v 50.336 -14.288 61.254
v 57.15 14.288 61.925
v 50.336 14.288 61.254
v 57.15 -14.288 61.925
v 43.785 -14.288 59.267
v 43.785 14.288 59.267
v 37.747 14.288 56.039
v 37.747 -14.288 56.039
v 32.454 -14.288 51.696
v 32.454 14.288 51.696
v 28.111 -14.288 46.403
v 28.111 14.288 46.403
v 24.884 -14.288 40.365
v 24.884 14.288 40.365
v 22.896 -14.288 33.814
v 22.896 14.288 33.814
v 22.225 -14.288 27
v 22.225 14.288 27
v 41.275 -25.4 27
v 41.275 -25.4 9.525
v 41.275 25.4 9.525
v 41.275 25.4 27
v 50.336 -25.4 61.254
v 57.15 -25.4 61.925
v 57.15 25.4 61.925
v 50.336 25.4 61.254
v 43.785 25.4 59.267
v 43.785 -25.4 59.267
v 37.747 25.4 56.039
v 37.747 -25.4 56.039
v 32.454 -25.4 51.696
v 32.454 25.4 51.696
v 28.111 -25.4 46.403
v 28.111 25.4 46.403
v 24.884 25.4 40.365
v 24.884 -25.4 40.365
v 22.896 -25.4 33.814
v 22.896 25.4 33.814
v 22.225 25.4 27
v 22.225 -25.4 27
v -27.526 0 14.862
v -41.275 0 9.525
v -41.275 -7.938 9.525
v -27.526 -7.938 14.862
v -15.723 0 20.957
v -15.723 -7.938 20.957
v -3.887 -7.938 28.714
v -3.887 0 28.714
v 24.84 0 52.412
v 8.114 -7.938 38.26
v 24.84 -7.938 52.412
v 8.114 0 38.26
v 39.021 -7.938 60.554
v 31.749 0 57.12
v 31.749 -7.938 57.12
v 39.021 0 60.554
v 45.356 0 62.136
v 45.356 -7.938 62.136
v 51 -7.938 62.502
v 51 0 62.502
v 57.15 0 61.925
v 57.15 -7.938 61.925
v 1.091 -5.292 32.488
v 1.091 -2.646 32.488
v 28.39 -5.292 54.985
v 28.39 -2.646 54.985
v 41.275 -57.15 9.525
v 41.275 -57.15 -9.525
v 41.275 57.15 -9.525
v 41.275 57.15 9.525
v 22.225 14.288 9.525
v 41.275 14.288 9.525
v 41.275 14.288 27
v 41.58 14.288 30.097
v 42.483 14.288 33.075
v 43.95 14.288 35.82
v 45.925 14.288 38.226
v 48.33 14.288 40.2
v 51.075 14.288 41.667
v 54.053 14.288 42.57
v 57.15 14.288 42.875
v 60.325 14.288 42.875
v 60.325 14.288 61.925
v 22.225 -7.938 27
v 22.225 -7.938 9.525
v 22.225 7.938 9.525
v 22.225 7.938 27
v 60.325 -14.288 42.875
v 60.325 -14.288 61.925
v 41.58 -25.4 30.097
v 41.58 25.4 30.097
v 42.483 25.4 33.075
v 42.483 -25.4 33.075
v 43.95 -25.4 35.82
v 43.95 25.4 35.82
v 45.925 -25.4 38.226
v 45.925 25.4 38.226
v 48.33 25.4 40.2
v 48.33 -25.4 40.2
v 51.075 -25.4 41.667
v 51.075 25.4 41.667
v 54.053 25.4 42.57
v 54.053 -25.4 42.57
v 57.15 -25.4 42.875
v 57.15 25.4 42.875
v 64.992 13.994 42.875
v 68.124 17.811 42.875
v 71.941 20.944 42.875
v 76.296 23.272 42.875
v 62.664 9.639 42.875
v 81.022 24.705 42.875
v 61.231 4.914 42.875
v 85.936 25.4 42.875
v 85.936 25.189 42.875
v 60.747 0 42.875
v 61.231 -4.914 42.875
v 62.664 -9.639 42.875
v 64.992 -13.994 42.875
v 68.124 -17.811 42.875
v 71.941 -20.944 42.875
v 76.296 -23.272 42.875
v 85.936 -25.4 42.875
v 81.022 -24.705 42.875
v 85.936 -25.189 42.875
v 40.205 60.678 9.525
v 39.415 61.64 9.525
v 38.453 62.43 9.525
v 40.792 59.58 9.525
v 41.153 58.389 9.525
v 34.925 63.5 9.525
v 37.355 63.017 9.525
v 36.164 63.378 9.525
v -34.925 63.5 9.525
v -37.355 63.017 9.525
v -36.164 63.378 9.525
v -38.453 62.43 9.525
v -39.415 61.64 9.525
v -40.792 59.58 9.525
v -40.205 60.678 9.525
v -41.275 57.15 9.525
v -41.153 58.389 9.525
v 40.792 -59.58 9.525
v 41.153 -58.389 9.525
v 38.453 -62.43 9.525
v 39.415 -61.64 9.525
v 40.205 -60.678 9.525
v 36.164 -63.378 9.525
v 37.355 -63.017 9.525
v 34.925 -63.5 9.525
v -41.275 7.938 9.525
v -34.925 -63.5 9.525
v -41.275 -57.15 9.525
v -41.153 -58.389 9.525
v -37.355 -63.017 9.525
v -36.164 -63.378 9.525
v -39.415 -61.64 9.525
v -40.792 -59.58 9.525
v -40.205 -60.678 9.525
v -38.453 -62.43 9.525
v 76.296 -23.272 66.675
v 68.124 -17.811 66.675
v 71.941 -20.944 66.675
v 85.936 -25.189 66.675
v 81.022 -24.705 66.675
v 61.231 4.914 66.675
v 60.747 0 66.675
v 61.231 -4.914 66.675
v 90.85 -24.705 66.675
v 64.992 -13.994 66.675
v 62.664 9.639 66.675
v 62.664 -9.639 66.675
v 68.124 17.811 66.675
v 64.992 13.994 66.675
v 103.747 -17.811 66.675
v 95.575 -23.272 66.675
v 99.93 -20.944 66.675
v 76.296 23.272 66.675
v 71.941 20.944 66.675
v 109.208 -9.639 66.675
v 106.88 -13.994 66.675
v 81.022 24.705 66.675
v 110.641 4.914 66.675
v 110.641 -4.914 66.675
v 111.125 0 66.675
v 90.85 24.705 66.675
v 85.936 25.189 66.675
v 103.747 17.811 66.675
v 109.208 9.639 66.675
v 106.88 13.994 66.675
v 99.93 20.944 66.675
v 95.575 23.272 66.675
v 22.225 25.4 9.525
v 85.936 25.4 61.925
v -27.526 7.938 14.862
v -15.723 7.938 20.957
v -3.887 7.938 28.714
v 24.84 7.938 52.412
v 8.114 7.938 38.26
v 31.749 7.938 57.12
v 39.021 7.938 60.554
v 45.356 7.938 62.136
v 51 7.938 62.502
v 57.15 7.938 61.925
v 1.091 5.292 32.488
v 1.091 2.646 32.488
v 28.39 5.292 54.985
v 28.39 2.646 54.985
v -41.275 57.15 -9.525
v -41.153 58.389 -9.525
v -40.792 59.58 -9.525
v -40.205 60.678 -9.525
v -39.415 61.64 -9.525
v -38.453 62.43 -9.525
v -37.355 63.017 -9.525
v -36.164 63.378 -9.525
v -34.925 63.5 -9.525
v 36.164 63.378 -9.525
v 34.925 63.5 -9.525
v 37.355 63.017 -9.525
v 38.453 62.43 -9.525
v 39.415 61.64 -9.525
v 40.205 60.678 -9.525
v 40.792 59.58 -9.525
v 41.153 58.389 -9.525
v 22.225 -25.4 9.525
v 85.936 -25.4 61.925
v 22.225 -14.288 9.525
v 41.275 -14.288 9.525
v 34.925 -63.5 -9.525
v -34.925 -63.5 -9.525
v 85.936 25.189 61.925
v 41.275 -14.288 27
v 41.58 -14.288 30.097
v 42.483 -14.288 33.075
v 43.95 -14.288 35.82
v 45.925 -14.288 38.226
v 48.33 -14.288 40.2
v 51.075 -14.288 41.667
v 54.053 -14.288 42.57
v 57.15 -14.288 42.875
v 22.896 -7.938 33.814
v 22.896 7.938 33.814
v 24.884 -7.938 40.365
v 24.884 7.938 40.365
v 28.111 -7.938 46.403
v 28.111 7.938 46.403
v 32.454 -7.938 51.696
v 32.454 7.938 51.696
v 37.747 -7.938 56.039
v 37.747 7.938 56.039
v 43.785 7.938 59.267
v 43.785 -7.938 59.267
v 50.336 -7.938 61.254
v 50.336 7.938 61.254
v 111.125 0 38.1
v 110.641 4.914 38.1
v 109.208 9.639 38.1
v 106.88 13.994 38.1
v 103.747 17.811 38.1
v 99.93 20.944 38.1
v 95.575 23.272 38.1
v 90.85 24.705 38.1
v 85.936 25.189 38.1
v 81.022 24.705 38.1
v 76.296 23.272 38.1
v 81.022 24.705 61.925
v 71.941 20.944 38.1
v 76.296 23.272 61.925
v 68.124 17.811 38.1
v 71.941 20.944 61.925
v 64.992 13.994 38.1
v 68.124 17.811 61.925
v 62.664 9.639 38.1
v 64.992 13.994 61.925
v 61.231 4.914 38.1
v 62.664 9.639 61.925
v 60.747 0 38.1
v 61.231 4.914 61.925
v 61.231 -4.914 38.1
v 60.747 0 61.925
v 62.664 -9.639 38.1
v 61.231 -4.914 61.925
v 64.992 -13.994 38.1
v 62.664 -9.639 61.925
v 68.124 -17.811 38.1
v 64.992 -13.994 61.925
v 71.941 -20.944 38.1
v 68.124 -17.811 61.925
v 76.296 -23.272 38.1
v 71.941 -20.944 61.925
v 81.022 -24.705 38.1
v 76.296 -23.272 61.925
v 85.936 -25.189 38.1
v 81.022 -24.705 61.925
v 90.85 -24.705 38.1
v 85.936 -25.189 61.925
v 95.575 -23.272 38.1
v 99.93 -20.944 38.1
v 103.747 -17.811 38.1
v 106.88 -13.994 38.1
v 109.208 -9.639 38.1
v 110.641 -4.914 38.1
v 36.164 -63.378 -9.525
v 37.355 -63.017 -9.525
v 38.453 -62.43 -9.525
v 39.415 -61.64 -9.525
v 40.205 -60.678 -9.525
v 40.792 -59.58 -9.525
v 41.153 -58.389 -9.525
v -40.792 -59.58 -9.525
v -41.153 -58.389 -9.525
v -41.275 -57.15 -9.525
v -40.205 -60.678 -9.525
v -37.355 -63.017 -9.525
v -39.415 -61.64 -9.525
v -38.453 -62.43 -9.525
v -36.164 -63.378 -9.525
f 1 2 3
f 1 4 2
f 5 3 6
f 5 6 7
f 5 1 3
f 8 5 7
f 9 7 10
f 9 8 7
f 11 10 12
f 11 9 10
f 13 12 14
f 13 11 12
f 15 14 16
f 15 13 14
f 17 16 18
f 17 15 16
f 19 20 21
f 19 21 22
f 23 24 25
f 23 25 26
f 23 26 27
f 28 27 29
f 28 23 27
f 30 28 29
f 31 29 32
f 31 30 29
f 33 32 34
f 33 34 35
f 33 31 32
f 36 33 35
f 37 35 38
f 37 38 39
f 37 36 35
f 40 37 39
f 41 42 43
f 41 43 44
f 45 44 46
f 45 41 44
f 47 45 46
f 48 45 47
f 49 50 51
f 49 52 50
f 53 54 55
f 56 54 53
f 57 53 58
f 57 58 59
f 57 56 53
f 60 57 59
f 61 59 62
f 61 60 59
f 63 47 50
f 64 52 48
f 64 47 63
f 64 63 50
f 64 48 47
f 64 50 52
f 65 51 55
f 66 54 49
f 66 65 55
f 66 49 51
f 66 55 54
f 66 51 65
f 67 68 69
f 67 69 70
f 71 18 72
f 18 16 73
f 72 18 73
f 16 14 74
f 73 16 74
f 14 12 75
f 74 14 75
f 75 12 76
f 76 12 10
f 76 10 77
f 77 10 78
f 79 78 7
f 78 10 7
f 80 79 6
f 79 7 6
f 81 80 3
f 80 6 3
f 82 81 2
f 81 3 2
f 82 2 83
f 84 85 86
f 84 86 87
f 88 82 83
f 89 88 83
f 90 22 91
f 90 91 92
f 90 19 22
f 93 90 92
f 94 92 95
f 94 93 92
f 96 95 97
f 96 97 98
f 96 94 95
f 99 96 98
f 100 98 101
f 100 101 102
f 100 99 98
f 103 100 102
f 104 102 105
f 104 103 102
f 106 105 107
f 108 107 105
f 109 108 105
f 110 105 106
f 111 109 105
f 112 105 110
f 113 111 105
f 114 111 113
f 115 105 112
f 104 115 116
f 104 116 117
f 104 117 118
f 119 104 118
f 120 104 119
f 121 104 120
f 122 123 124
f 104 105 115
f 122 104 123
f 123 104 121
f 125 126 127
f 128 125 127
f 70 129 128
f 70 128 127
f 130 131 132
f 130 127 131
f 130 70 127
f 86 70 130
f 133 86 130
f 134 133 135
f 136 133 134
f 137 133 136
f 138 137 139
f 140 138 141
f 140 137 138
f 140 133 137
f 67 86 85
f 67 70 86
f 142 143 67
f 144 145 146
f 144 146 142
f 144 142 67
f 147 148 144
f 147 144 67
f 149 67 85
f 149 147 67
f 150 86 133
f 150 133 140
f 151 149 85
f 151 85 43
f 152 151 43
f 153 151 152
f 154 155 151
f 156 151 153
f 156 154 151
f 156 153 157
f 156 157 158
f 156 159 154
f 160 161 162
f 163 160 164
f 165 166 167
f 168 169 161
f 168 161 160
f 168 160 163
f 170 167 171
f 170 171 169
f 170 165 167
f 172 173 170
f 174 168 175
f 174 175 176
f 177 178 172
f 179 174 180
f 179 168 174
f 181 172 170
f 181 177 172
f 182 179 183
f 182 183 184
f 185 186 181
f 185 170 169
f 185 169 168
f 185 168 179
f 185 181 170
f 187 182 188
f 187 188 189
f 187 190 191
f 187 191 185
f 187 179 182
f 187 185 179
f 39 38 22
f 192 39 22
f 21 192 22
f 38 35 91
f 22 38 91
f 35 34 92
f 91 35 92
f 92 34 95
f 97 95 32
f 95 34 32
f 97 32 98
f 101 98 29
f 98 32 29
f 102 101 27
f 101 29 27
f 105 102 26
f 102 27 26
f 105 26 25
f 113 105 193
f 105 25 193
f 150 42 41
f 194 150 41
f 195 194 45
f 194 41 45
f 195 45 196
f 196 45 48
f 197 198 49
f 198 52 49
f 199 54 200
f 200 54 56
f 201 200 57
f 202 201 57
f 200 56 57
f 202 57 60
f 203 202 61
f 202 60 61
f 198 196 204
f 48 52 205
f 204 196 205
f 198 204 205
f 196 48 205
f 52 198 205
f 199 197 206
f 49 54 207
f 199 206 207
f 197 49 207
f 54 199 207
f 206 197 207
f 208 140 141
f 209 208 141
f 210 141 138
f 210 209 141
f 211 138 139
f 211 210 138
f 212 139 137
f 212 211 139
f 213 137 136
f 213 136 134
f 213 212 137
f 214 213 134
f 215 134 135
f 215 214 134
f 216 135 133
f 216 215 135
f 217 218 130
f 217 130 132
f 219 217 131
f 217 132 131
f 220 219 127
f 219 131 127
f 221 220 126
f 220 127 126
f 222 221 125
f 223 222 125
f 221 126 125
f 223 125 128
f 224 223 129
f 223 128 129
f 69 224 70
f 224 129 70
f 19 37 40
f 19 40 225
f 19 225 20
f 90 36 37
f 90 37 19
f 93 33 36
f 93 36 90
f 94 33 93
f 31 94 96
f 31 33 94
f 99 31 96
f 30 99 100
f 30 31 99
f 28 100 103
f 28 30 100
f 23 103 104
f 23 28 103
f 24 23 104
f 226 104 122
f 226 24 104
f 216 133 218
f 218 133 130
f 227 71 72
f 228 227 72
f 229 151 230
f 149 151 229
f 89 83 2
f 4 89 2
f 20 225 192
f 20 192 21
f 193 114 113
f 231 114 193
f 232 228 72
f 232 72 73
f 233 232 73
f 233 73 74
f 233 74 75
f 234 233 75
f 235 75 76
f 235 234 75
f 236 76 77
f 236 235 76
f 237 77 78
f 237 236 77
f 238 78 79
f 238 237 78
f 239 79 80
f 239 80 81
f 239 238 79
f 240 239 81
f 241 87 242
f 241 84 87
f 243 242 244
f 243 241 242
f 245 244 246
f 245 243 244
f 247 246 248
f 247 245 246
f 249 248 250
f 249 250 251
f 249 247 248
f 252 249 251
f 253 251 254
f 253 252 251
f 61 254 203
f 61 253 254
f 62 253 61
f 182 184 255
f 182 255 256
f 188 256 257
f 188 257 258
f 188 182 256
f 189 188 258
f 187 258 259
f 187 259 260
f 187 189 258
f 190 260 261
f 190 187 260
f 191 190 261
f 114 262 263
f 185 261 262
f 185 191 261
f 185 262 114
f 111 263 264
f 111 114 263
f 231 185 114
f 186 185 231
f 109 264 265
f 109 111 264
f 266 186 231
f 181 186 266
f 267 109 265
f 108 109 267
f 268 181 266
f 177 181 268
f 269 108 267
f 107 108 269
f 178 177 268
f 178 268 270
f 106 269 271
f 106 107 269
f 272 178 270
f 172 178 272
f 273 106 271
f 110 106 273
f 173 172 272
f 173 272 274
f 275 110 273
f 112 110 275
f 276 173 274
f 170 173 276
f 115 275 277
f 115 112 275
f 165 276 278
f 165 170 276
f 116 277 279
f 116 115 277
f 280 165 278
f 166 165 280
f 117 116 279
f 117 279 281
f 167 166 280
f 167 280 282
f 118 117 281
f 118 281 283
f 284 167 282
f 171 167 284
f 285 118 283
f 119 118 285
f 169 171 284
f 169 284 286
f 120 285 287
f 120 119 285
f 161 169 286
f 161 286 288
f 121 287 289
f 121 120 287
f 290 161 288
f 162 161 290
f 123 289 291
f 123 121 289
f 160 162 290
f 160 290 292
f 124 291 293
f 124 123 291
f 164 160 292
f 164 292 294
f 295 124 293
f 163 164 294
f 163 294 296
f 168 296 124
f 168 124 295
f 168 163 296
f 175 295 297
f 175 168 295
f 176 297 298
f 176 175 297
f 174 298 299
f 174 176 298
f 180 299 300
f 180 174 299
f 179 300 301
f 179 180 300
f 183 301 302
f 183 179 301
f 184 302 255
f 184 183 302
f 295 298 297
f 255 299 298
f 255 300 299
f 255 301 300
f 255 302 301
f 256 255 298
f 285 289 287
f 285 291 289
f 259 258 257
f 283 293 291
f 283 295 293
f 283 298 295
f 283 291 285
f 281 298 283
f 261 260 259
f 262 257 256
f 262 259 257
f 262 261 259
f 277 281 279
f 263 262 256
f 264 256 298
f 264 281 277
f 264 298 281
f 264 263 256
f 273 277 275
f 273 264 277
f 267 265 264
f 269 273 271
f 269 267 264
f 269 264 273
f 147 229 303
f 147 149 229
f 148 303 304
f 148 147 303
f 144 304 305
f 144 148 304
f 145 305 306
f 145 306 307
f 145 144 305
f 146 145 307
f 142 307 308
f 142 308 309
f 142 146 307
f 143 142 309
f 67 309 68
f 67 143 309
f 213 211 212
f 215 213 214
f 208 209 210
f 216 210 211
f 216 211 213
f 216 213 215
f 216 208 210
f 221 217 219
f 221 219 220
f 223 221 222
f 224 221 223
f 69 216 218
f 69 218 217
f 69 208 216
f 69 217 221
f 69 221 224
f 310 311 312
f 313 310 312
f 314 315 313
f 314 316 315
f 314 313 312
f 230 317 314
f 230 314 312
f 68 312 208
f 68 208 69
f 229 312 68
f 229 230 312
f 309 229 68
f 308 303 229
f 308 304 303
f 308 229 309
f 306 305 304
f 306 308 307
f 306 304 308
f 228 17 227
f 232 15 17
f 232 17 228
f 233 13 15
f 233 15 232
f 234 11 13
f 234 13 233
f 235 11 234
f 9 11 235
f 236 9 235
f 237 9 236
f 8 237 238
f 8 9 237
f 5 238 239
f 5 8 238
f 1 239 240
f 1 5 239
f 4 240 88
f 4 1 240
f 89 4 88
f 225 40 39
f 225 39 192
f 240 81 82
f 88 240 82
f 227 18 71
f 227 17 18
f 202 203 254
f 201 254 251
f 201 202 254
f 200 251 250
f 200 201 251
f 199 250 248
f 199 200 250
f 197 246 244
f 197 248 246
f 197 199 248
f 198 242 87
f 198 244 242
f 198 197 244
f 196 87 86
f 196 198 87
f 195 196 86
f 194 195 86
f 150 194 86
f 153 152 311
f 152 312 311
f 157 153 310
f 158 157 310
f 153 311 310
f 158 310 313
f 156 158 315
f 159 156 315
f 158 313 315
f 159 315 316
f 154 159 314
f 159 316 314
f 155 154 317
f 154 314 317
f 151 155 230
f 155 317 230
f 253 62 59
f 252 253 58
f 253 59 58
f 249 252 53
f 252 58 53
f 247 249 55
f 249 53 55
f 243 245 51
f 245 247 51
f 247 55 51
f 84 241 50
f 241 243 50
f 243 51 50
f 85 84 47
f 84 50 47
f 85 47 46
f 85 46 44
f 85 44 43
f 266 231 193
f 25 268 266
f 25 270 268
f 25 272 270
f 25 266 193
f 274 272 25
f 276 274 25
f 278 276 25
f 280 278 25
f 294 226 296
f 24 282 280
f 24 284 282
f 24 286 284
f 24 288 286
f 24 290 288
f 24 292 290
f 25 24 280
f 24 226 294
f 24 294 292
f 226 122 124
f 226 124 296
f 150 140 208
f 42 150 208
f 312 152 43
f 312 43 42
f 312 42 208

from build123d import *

# Parameters (mm, degrees)
F1_DEPTH = 63.5
F0_W     = 25.6108161688
F0_H     = 19.05
F2_DEPTH = 25.4
F3_DEPTH = 7.9375
F4_DEPTH = 14.2875
F6_R     = 6.35


with BuildPart() as f1:
    # F0 (on Front) → F1 (new body, symmetric)
    with BuildSketch(Plane.XZ):
        Polygon((-41.275, 9.525), (-41.275, -9.525), (41.275, -9.525), (41.275, 9.525), (22.225, 9.525), align=None)
    extrude(amount=F1_DEPTH, both=True)

    # F0 (on Front) → F3 (join, symmetric)
    with BuildSketch(Plane.XZ):
        with BuildLine():
            add(Edge.make_bspline(
                [(-41.275, 9.525), (14.1316680238, 27.6904311031), (22.1523437649, 67.793816328), (57.15, 61.9252)],
                knots=[0, 0, 0, 0, 111.5045361635, 111.5045361635, 111.5045361635, 111.5045361635], degree=3))
            Line((-41.275, 9.525), (22.225, 9.525))
            Line((22.225, 9.525), (22.225, 27.0002))
            ThreePointArc((22.225, 27.0002), (32.4542956671, 51.6959043329), (57.15, 61.9252))
        make_face()
    extrude(amount=F3_DEPTH, both=True)

    # F6
    f6_edges = [f1.edges().sort_by_distance(p)[0] for p in [
        (41.275, -63.5, 0),
        (-41.275, -63.5, 0),
        (41.275, 63.5, 0),
        (-41.275, 63.5, 0),
    ]]
    fillet(f6_edges, radius=F6_R)


with BuildPart() as f2:
    # F0 (on Front) → F2 (new body, symmetric)
    with BuildSketch(Plane.XZ):
        with Locations((73.1304080844, 52.4002)):
            Rectangle(F0_W, F0_H)
        with BuildLine():
            Line((22.225, 9.525), (41.275, 9.525))
            Line((41.275, 9.525), (41.275, 27.0002))
            ThreePointArc((41.275, 27.0002), (45.9246798487, 38.2255201513), (57.15, 42.8752))
            Line((57.15, 42.8752), (60.325, 42.8752))
            Line((60.325, 42.8752), (60.325, 61.9252))
            Line((60.325, 61.9252), (57.15, 61.9252))
            ThreePointArc((57.15, 61.9252), (32.4542956671, 51.6959043329), (22.225, 27.0002))
            Line((22.225, 27.0002), (22.225, 9.525))
        make_face()
    extrude(amount=F2_DEPTH, both=True)

    # F0 (on Front) → F5 (revolve)
    with BuildSketch(Plane.XZ):
        Polygon((85.9358161688, 66.675), (85.9358161688, 61.9252), (85.9358161688, 42.8752), (85.9358161688, 38.1), (111.125, 38.1), (111.125, 66.675), align=None)
    revolve(axis=Axis((85.9358161688, 0, 52.3875), (0, 0, 1)))


with BuildPart() as f4:
    # F0 (on Front) → F4 (new body, symmetric)
    with BuildSketch(Plane.XZ):
        with BuildLine():
            Line((22.225, 9.525), (41.275, 9.525))
            Line((41.275, 9.525), (41.275, 27.0002))
            ThreePointArc((41.275, 27.0002), (45.9246798487, 38.2255201513), (57.15, 42.8752))
            Line((57.15, 42.8752), (60.325, 42.8752))
            Line((60.325, 42.8752), (60.325, 61.9252))
            Line((60.325, 61.9252), (57.15, 61.9252))
            ThreePointArc((57.15, 61.9252), (32.4542956671, 51.6959043329), (22.225, 27.0002))
            Line((22.225, 27.0002), (22.225, 9.525))
        make_face()
    extrude(amount=F4_DEPTH, both=True)


solid = Compound([f1.part, f2.part, f4.part])
